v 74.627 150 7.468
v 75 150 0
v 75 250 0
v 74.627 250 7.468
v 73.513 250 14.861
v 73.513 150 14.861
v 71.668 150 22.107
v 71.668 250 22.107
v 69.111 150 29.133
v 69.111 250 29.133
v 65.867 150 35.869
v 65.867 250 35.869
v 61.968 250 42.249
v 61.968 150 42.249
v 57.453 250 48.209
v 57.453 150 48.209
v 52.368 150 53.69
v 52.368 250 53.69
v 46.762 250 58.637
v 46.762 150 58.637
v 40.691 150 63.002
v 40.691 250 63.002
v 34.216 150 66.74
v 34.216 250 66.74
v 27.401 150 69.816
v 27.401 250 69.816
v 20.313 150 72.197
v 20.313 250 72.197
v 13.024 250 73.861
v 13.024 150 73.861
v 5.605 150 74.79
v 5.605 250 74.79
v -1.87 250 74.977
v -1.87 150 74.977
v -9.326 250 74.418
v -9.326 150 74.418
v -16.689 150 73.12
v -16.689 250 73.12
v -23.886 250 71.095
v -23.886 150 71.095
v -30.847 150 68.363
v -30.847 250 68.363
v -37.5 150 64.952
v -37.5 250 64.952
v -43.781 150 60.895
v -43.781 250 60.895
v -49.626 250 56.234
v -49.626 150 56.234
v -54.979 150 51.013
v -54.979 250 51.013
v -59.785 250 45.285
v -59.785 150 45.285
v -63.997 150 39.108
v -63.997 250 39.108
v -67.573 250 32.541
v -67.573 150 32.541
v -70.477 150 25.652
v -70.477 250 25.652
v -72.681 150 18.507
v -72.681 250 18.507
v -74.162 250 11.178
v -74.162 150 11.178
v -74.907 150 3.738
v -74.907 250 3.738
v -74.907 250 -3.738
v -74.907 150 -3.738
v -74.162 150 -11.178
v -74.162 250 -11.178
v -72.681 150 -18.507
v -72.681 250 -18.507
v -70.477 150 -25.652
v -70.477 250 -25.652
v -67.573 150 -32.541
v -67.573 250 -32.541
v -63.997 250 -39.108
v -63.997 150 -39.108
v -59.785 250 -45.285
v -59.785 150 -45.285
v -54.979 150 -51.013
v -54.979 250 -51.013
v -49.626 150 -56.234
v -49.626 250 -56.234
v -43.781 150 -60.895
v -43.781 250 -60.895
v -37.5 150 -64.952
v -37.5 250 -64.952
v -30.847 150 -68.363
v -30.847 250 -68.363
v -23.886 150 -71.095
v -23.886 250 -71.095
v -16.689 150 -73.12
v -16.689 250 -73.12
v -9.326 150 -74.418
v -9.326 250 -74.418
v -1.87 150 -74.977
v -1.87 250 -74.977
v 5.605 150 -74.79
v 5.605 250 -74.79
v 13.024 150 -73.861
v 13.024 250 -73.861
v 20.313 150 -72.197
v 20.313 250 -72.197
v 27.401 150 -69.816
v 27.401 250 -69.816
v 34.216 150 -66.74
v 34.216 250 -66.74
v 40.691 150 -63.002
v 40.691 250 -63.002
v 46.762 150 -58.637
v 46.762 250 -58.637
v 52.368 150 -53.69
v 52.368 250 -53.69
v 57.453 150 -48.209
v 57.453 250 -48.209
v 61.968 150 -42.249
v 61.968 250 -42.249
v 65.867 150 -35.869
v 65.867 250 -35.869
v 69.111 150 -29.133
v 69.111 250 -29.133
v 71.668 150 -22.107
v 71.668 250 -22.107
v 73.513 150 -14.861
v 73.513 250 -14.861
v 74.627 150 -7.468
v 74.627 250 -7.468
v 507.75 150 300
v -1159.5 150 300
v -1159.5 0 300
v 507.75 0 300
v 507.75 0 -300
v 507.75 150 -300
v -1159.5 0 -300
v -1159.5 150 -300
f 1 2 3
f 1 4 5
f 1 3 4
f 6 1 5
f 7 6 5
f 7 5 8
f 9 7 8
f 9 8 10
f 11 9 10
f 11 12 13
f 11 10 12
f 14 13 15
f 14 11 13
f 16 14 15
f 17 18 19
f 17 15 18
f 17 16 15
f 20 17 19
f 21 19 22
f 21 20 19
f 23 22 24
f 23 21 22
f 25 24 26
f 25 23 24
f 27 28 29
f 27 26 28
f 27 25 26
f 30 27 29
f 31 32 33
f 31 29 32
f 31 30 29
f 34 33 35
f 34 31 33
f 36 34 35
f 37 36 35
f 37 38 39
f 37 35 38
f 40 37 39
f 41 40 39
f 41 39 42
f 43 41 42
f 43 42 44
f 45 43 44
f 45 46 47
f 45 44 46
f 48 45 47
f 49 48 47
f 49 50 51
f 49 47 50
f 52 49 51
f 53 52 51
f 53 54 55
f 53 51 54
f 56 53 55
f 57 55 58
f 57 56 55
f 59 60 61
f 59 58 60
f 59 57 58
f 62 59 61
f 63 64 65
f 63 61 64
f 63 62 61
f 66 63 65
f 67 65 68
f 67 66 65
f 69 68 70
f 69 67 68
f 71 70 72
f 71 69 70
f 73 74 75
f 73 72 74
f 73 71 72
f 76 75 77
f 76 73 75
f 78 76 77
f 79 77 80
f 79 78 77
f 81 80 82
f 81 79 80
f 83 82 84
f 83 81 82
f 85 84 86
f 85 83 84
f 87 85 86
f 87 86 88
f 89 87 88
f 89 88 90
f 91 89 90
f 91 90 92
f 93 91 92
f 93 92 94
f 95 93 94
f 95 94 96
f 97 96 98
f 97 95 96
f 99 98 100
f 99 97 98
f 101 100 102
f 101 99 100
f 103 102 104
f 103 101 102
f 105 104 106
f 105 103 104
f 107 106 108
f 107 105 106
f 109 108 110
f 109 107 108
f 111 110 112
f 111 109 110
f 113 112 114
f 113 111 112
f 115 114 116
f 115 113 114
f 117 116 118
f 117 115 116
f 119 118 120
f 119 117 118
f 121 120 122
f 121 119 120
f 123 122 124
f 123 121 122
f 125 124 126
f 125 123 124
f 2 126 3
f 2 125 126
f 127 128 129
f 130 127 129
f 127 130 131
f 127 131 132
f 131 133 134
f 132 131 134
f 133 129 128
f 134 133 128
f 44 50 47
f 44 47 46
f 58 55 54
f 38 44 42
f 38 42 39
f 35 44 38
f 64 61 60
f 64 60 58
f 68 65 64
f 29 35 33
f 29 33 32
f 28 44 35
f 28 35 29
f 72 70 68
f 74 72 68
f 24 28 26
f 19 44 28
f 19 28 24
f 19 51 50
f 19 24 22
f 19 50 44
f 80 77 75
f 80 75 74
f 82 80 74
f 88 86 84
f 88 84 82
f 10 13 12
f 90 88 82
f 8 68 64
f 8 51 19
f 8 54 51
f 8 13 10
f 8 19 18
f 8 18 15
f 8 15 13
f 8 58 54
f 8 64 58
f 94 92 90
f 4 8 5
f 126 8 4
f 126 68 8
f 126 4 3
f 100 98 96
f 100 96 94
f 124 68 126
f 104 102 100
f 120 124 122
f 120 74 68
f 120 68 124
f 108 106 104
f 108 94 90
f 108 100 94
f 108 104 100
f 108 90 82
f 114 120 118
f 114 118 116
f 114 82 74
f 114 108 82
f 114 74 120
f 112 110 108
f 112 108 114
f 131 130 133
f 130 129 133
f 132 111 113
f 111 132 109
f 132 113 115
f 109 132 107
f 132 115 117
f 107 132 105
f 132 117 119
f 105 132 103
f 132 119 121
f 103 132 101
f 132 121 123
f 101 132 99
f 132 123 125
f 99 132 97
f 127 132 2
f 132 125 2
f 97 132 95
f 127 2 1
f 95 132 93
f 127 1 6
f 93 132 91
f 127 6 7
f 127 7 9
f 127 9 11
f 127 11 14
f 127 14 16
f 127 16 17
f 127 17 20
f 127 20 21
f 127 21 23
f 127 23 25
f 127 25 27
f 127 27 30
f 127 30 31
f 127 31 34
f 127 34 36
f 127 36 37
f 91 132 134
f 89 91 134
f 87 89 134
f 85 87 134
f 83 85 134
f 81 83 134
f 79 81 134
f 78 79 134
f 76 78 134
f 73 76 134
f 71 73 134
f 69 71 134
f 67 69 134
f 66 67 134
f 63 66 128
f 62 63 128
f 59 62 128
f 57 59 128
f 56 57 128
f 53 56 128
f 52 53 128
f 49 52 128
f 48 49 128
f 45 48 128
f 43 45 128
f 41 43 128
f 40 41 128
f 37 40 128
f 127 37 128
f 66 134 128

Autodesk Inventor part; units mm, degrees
ref_plane "YZ Plane" through (0, 0, 0) normal (1, 0, 0) x (0, 1, 0)
ref_plane "XZ Plane" through (0, 0, 0) normal (0, 1, 0) x (-1, 0, 0)
ref_plane "XY Plane" through (0, 0, 0) normal (0, 0, 1) x (1, 0, 0)
sketch "Sketch1" plane through (0, 0, 0) normal (1, 0, 0) x (0, 1, 0)
  line L0 (0, -300) -> (150, -300)
  line L1 (150, -300) -> (150, 300)
  line L2 (150, 300) -> (0, 300)
  line L3 (0, 300) -> (0, -300)
  line L4 (150, -110.5085) -> (250, -110.5085)
  line L5 (250, -110.5085) -> (250, 120.1522)
  line L6 (250, 120.1522) -> (150, 120.1522)
  line L7 (150, 120.1522) -> (150, -110.5085)
  line L8 (250, -527.4169) -> (326.5108, -527.4169)
  line L9 (326.5108, -527.4169) -> (326.5108, 687.4915)
  line L10 (326.5108, 687.4915) -> (250, 687.4915)
  line L11 (250, 687.4915) -> (250, -527.4169)
  line L12 (326.5108, -527.4169) -> (729.0925, -527.4169)
  line L13 (326.5108, 687.4915) -> (739.1213, 687.4915)
  point P0 (0, 0)
  point P1 (0, 0)
  dimension "d0" = 600
  dimension "d1" = 150
  dimension "d2" = 100
sketch "Sketch2" plane through (0, 0, 0) normal (1, 0, 0) x (0, 1, 0)
  line L0 (0, -300) -> (150, -300)
  line L1 (150, -300) -> (150, 300)
  line L2 (150, 300) -> (0, 300)
  line L3 (0, 300) -> (0, -300)
  point P0 (0, 0)
  point P1 (0, 0)
  dimension "d3" = 600
  dimension "d4" = 150
extrude "Extrusion1" add sketch "Sketch2" along normal blind 507.75 and the other way blind 1159.5
sketch "Sketch3" plane through (-1159.5, 150, 300) normal (0, 1, 0) x (1, 0, 0)
  circle A0 centre (1159.5, 300) radius 75
  dimension "d9" = 150
extrude "Extrusion2" add sketch "Sketch3" along normal blind 100
sketch3d "3D Sketch1"
equation "\"d3\" = d0"
equation "\"d4\" = d1"
equation "\"d10\" = d2"
properties part number "MSC DIM 012 carriage nose"
